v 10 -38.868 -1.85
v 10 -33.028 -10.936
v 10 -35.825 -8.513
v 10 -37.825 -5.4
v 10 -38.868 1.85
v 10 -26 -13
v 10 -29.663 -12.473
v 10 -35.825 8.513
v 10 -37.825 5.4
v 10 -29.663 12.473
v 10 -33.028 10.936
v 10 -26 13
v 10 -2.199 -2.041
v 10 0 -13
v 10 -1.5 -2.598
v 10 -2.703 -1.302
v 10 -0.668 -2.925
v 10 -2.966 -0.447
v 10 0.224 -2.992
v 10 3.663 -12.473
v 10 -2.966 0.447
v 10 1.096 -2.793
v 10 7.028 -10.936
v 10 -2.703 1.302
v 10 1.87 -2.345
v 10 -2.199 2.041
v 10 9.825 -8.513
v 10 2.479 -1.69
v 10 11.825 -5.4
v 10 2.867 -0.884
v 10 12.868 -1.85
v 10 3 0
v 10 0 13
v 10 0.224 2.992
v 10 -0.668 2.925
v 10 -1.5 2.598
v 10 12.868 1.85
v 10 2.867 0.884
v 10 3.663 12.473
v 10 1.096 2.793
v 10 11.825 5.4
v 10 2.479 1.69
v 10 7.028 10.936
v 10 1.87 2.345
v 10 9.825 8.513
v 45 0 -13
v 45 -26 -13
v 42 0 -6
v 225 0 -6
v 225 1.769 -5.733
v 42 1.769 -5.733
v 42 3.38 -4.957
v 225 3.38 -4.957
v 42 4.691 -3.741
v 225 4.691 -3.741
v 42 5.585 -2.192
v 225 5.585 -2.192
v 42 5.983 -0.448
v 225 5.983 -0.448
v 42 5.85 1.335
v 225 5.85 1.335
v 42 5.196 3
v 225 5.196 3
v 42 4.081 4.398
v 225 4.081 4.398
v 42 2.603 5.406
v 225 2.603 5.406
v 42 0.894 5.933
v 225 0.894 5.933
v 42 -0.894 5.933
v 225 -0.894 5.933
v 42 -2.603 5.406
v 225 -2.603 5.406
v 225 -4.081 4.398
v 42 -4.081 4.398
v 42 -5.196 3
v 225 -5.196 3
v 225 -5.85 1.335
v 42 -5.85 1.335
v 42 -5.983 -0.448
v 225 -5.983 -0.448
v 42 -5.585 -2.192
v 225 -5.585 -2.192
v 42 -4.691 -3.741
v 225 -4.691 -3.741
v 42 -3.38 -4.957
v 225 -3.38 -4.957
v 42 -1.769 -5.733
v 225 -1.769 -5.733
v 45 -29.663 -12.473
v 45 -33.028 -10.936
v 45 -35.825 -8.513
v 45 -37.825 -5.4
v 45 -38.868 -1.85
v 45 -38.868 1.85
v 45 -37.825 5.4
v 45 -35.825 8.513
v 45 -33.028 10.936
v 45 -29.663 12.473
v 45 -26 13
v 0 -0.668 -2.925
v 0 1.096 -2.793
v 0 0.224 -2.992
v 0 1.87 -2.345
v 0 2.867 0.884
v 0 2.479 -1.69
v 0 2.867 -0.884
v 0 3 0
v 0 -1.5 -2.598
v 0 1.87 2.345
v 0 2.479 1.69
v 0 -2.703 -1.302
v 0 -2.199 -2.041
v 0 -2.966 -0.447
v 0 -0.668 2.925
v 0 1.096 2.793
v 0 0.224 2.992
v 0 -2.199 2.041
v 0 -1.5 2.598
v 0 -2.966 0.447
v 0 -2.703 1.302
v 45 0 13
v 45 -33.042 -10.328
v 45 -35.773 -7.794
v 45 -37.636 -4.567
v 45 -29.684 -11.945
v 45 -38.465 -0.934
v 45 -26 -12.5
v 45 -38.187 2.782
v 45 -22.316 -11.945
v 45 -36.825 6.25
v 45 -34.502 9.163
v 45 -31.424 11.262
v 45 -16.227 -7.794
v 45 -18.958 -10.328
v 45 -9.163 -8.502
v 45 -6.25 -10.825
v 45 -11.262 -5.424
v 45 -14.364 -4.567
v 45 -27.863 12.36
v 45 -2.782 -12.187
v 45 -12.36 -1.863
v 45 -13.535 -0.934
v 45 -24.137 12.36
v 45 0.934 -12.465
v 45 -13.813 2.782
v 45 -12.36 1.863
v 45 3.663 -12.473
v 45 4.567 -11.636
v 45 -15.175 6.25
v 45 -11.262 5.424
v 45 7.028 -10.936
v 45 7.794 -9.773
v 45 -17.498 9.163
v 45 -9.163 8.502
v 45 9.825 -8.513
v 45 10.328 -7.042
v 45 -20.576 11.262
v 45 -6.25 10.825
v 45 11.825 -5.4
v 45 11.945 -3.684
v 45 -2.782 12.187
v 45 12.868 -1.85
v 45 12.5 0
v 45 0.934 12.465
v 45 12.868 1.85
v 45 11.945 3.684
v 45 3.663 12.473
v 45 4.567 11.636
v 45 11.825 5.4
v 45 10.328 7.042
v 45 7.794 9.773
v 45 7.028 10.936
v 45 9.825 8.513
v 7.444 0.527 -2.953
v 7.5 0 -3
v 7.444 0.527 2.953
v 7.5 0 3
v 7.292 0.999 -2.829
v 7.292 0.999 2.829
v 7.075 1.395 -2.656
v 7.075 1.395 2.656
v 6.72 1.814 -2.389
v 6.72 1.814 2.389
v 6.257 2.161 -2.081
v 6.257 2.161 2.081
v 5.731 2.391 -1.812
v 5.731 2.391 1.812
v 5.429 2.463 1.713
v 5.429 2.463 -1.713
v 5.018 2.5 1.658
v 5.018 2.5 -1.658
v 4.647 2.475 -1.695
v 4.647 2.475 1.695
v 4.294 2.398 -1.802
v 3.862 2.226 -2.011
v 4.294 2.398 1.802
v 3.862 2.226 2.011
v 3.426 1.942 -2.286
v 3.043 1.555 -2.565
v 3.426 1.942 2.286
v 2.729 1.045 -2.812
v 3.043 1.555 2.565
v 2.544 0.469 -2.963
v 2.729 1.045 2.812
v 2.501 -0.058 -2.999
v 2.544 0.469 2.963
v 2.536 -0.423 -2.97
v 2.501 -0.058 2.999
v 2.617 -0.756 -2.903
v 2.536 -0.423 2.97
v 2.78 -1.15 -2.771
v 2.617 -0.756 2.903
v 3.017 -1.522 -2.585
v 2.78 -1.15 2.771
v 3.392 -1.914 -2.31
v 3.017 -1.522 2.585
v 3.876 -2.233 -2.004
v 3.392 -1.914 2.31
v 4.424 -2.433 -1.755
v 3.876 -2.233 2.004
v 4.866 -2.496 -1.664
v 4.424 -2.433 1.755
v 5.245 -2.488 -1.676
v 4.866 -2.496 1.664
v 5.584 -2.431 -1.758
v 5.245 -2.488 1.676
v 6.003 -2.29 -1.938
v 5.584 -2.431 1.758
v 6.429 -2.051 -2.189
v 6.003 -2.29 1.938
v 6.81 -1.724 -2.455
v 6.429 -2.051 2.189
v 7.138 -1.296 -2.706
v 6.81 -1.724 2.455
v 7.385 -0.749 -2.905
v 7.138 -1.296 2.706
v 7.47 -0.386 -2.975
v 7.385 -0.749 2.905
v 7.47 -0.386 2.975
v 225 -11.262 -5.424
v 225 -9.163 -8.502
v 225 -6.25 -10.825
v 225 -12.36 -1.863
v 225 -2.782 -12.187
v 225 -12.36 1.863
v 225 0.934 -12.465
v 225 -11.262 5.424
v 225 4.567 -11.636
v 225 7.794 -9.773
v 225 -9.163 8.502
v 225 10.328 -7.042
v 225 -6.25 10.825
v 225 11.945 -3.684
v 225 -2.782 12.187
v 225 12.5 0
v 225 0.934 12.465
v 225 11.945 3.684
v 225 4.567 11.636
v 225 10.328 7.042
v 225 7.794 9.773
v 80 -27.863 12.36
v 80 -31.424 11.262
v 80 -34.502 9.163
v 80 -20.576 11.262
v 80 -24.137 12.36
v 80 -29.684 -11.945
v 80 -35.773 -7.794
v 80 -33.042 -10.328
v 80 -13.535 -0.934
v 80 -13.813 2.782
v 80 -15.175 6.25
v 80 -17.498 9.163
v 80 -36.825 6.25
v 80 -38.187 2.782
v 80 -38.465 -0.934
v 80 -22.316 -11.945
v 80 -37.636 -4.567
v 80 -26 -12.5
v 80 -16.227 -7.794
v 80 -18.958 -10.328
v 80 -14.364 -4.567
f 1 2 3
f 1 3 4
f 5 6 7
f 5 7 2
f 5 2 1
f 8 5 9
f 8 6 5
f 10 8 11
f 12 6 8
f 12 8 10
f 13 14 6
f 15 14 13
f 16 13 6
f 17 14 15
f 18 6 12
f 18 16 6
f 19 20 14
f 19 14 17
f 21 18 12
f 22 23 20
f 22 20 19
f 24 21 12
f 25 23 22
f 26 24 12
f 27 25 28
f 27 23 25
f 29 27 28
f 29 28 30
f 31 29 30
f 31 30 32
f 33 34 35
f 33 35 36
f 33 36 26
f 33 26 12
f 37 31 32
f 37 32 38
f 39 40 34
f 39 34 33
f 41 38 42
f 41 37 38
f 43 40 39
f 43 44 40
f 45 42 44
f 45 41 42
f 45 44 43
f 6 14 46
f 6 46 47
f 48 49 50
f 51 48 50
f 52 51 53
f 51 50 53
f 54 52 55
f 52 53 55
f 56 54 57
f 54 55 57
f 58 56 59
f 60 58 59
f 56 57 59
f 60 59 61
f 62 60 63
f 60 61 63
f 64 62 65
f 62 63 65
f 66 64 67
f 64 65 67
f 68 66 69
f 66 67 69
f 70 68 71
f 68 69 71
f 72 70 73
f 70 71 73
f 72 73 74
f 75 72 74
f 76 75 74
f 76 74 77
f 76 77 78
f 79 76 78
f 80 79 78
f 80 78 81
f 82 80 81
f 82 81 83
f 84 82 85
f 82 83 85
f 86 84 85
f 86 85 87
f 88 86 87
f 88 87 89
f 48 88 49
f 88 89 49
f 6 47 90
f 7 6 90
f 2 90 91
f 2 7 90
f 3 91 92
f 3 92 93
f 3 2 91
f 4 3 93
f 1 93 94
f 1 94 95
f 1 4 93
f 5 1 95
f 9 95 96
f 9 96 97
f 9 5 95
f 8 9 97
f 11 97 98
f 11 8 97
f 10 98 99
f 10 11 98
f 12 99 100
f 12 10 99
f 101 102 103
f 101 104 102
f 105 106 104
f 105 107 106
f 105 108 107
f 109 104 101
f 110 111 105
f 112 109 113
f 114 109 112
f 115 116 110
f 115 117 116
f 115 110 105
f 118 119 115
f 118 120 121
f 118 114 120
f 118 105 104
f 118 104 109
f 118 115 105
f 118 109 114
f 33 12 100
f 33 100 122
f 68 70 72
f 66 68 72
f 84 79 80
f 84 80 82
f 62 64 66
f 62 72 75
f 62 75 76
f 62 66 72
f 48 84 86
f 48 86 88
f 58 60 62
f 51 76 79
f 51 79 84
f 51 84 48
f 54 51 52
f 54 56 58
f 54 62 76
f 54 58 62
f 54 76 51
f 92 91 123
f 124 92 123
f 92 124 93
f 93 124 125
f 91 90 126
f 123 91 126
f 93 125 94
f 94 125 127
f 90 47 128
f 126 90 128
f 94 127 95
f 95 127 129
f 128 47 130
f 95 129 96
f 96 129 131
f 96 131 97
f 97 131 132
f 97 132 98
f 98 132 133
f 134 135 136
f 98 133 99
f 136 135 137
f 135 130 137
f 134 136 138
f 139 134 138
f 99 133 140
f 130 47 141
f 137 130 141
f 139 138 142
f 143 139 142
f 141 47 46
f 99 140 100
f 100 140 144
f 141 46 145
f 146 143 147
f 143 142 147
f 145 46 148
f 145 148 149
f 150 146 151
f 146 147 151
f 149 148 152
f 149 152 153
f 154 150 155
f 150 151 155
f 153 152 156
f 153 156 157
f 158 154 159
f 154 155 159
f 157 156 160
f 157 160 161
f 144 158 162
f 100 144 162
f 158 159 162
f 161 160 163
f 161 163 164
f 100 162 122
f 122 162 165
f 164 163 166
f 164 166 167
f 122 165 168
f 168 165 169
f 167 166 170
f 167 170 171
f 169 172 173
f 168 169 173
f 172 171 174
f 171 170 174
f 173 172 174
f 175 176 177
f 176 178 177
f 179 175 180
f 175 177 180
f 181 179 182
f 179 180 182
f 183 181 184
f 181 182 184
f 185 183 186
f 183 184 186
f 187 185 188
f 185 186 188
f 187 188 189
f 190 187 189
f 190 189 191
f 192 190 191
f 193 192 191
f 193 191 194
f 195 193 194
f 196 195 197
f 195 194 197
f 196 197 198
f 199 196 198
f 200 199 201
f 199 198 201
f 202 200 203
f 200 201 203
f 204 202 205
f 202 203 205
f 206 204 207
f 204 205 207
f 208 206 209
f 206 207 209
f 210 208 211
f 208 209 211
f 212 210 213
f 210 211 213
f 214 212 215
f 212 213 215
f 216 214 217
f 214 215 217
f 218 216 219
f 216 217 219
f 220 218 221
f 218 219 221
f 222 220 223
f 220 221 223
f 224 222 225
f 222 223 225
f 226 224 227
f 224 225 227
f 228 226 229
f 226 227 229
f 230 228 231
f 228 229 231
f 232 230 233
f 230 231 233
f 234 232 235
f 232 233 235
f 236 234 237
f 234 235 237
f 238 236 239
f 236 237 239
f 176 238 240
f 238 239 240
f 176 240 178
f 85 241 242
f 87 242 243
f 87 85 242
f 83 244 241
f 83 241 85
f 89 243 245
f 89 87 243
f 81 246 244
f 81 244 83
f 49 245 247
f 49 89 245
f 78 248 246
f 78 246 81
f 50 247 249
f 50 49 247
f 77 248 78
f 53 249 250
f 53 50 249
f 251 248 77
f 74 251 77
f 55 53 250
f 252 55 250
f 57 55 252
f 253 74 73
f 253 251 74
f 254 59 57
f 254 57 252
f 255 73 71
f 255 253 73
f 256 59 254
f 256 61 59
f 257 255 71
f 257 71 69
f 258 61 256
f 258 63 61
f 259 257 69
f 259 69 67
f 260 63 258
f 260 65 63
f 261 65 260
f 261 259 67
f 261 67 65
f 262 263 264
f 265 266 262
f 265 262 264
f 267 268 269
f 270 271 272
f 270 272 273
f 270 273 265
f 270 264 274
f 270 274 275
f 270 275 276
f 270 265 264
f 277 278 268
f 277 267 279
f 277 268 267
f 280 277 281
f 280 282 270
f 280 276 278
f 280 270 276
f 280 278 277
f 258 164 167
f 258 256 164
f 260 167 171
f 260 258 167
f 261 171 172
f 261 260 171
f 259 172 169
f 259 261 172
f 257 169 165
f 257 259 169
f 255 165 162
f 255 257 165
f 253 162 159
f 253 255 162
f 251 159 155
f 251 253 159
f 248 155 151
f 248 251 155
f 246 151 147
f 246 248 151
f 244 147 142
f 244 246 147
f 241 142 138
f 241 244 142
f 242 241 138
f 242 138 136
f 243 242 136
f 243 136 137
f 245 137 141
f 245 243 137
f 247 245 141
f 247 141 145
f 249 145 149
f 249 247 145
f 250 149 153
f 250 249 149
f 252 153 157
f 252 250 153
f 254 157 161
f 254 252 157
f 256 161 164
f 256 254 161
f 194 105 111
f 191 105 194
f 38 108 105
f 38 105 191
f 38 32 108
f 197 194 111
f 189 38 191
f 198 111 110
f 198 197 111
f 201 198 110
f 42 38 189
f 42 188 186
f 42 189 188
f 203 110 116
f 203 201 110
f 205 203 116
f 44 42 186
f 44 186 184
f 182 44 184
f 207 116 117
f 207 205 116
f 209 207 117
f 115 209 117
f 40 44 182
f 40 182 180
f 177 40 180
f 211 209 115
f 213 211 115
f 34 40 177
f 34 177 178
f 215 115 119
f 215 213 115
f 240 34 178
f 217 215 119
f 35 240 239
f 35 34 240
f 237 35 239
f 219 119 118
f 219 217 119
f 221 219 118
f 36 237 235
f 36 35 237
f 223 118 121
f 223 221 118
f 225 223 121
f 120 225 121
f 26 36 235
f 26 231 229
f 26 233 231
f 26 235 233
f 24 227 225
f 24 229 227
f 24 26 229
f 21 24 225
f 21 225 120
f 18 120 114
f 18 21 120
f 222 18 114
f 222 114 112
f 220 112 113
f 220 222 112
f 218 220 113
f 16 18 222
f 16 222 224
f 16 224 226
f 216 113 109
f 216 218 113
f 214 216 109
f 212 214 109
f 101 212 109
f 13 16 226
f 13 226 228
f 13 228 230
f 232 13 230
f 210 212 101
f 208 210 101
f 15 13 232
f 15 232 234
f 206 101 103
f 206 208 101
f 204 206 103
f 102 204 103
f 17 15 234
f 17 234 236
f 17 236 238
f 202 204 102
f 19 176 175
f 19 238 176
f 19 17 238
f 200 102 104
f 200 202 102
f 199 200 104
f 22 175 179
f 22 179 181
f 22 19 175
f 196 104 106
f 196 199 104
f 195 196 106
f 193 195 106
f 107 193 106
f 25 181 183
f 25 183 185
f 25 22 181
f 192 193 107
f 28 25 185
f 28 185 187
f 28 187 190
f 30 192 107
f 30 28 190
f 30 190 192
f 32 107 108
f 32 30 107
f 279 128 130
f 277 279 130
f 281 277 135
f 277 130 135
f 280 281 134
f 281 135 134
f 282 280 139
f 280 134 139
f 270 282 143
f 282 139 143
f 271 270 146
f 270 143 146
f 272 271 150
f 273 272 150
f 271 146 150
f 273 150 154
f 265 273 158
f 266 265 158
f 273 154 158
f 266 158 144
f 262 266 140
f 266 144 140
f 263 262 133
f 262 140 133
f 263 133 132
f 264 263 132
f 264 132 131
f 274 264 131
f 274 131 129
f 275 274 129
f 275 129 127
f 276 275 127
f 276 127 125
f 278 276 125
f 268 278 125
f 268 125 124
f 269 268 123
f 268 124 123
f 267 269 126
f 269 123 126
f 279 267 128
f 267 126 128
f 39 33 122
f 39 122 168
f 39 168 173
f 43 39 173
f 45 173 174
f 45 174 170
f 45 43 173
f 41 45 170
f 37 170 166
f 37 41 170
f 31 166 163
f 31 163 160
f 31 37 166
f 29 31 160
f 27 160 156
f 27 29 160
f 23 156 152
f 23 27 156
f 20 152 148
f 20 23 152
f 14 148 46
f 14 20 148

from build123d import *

# Parameters (mm, degrees)
SKETCH3_R               = 2.5
CUT_EXTRUDE2_DEPTH      = 13.5
CUT_EXTRUDE2_DEPTH_BACK = 13.5
SKETCH2_R               = 6
CUT_EXTRUDE3_DEPTH      = 183
SKETCH4_R               = 12.5
BOSS_EXTRUDE1_DEPTH     = 35
SKETCH5_R               = 12.5
BOSS_EXTRUDE2_DEPTH     = 35


with BuildPart() as part:
    # Sketch1 → Revolve1 (revolve)
    with BuildSketch(Plane.XY):
        Polygon((0, 0), (0, 3), (10, 3), (10, 12.5), (225, 12.5), (225, 0), align=None)
    revolve(axis=Axis((0, 0, 0), (1, 0, 0)))

    # Sketch3 → Cut-Extrude2 (cut, two sides)
    with BuildSketch(Plane.XY) as cut_extrude2_sk:
        with Locations((5, 0)):
            Circle(SKETCH3_R)
    extrude(amount=CUT_EXTRUDE2_DEPTH, mode=Mode.SUBTRACT)
    extrude(cut_extrude2_sk.sketch, amount=-CUT_EXTRUDE2_DEPTH_BACK, mode=Mode.SUBTRACT)

    # Sketch2 → Cut-Extrude3 (cut)
    with BuildSketch(Plane(origin=(225, 0, 0), x_dir=(0, 0, -1), z_dir=(1, 0, 0))):
        Circle(SKETCH2_R)
    extrude(amount=-CUT_EXTRUDE3_DEPTH, mode=Mode.SUBTRACT)

    # Sketch4 → Boss-Extrude1 (add)
    with BuildSketch(Plane.ZY.offset(-10)):
        with BuildLine():
            Line((-13, 0), (-13, -26))
            ThreePointArc((-13, -26), (0, -39), (13, -26))
            Line((13, -26), (13, 0))
            ThreePointArc((13, 0), (0, 13), (-13, 0))
        make_face()
        Circle(SKETCH4_R, mode=Mode.SUBTRACT)
    extrude(amount=-BOSS_EXTRUDE1_DEPTH)

    # Sketch5 → Boss-Extrude2 (add)
    with BuildSketch(Plane(origin=(45, 0, 0), x_dir=(0, 0, -1), z_dir=(1, 0, 0))):
        with Locations((0, -26)):
            Circle(SKETCH5_R)
    extrude(amount=BOSS_EXTRUDE2_DEPTH)


solid = part.part
